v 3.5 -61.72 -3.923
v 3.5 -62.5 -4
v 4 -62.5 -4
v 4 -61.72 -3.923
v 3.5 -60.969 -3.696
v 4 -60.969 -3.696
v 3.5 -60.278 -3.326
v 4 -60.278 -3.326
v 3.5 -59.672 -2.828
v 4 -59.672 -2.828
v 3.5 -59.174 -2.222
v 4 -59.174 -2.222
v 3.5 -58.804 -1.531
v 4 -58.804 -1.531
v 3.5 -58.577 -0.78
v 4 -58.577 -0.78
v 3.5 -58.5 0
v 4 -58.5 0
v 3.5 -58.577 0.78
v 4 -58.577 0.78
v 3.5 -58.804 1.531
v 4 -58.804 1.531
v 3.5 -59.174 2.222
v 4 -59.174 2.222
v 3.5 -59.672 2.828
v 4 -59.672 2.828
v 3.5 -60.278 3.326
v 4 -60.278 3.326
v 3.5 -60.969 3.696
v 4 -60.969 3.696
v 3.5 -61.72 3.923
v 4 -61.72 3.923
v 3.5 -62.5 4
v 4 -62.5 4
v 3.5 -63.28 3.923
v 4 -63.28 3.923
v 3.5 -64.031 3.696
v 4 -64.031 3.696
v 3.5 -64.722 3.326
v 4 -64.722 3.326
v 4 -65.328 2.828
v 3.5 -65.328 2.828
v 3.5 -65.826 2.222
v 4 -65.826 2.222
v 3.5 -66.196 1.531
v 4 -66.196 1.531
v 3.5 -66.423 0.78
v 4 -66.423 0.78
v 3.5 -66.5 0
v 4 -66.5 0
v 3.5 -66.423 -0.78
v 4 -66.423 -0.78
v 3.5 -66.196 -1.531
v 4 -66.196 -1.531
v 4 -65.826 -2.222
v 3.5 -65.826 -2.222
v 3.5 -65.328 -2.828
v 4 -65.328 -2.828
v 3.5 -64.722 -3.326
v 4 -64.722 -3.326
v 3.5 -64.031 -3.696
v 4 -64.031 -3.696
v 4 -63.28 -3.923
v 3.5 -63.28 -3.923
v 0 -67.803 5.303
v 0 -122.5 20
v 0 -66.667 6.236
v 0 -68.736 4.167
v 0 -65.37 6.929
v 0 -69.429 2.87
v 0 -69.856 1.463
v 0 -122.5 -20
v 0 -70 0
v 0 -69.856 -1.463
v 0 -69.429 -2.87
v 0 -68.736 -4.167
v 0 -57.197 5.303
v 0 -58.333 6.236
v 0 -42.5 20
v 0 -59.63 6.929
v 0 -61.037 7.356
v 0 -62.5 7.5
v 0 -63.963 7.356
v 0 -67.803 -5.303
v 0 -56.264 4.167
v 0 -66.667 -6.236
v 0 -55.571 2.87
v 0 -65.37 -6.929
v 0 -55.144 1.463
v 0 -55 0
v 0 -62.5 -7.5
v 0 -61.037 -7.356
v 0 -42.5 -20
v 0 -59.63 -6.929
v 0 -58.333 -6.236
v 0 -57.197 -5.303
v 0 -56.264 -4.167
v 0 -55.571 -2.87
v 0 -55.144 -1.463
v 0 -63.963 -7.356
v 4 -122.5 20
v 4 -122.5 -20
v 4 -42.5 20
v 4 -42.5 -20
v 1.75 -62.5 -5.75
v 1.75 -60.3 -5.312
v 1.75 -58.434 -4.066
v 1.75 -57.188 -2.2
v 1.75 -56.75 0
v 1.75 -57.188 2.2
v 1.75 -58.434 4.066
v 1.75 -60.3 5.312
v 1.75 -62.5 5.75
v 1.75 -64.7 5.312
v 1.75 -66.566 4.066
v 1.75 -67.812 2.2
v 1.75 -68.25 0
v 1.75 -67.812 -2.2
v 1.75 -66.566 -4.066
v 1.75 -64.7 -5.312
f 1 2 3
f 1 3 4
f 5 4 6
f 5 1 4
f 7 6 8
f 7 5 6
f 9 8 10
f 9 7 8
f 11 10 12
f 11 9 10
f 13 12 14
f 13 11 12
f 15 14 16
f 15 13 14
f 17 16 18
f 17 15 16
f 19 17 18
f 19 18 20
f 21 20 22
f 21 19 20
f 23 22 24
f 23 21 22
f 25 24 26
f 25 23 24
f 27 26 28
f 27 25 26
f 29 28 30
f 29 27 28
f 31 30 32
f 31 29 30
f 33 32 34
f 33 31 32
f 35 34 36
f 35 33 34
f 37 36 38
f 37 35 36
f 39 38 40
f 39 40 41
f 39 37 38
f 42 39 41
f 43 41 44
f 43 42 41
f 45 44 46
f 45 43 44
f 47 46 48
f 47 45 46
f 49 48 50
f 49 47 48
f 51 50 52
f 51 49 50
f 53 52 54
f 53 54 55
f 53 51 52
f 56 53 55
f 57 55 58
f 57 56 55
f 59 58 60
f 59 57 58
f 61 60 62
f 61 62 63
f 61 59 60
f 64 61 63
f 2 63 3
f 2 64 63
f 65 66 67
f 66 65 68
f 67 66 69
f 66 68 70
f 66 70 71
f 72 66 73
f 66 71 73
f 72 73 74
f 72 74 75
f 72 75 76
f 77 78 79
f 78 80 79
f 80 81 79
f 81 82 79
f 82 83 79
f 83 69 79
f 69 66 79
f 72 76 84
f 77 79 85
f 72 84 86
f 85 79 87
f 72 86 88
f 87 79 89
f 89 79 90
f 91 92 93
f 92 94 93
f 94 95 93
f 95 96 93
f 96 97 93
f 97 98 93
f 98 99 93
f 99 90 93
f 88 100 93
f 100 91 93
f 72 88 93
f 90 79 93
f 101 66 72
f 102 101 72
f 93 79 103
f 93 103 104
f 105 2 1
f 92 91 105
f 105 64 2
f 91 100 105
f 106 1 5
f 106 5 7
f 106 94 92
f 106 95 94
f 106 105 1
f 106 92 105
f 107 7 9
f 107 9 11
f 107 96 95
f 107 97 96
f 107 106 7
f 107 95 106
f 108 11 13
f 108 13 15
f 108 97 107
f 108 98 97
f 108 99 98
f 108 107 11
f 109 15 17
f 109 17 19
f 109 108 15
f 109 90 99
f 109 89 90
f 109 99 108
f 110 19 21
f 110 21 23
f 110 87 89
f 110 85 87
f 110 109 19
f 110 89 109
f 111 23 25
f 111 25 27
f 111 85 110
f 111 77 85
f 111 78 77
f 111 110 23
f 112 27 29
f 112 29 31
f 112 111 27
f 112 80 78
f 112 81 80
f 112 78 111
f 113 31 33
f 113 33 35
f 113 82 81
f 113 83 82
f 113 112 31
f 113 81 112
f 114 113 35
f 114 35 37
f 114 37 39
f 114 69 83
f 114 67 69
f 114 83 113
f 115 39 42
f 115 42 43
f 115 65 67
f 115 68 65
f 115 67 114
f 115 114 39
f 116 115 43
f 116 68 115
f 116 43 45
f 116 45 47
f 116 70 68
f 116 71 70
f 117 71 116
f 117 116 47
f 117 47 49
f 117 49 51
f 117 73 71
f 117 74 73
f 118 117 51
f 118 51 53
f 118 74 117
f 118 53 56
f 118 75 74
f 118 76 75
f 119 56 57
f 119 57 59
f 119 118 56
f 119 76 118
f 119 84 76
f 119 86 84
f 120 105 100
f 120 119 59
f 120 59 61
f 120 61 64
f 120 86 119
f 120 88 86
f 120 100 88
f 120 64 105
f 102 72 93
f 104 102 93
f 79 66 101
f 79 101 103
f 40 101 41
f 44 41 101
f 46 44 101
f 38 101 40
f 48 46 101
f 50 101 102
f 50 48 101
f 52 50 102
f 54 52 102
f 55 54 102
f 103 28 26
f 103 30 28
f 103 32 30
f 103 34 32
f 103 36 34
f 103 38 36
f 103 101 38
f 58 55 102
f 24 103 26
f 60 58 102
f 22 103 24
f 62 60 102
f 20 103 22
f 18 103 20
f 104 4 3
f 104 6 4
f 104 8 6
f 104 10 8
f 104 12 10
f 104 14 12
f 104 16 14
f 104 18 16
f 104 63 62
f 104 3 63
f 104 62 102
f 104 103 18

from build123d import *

# Parameters (mm, degrees)
SKETCH1_W           = 40
SKETCH1_H           = 80
SKETCH1_R           = 4
BOSS_EXTRUDE1_DEPTH = 4
CHAMFER1_SIZE       = 3.5


with BuildPart() as part:
    # Sketch1 → Boss-Extrude1 (new body)
    with BuildSketch(Plane(origin=(0, 0, 0), x_dir=(0, 0, -1), z_dir=(1, 0, 0))):
        with Locations((0, -82.5)):
            Rectangle(SKETCH1_W, SKETCH1_H)
        with Locations((0, -62.5)):
            Circle(SKETCH1_R, mode=Mode.SUBTRACT)
    extrude(amount=BOSS_EXTRUDE1_DEPTH)

    # Chamfer1
    chamfer1_edges = [part.edges().sort_by_distance(p)[0] for p in [
        (0, -62.5, 4),
    ]]
    chamfer(chamfer1_edges, length=CHAMFER1_SIZE)


solid = part.part
